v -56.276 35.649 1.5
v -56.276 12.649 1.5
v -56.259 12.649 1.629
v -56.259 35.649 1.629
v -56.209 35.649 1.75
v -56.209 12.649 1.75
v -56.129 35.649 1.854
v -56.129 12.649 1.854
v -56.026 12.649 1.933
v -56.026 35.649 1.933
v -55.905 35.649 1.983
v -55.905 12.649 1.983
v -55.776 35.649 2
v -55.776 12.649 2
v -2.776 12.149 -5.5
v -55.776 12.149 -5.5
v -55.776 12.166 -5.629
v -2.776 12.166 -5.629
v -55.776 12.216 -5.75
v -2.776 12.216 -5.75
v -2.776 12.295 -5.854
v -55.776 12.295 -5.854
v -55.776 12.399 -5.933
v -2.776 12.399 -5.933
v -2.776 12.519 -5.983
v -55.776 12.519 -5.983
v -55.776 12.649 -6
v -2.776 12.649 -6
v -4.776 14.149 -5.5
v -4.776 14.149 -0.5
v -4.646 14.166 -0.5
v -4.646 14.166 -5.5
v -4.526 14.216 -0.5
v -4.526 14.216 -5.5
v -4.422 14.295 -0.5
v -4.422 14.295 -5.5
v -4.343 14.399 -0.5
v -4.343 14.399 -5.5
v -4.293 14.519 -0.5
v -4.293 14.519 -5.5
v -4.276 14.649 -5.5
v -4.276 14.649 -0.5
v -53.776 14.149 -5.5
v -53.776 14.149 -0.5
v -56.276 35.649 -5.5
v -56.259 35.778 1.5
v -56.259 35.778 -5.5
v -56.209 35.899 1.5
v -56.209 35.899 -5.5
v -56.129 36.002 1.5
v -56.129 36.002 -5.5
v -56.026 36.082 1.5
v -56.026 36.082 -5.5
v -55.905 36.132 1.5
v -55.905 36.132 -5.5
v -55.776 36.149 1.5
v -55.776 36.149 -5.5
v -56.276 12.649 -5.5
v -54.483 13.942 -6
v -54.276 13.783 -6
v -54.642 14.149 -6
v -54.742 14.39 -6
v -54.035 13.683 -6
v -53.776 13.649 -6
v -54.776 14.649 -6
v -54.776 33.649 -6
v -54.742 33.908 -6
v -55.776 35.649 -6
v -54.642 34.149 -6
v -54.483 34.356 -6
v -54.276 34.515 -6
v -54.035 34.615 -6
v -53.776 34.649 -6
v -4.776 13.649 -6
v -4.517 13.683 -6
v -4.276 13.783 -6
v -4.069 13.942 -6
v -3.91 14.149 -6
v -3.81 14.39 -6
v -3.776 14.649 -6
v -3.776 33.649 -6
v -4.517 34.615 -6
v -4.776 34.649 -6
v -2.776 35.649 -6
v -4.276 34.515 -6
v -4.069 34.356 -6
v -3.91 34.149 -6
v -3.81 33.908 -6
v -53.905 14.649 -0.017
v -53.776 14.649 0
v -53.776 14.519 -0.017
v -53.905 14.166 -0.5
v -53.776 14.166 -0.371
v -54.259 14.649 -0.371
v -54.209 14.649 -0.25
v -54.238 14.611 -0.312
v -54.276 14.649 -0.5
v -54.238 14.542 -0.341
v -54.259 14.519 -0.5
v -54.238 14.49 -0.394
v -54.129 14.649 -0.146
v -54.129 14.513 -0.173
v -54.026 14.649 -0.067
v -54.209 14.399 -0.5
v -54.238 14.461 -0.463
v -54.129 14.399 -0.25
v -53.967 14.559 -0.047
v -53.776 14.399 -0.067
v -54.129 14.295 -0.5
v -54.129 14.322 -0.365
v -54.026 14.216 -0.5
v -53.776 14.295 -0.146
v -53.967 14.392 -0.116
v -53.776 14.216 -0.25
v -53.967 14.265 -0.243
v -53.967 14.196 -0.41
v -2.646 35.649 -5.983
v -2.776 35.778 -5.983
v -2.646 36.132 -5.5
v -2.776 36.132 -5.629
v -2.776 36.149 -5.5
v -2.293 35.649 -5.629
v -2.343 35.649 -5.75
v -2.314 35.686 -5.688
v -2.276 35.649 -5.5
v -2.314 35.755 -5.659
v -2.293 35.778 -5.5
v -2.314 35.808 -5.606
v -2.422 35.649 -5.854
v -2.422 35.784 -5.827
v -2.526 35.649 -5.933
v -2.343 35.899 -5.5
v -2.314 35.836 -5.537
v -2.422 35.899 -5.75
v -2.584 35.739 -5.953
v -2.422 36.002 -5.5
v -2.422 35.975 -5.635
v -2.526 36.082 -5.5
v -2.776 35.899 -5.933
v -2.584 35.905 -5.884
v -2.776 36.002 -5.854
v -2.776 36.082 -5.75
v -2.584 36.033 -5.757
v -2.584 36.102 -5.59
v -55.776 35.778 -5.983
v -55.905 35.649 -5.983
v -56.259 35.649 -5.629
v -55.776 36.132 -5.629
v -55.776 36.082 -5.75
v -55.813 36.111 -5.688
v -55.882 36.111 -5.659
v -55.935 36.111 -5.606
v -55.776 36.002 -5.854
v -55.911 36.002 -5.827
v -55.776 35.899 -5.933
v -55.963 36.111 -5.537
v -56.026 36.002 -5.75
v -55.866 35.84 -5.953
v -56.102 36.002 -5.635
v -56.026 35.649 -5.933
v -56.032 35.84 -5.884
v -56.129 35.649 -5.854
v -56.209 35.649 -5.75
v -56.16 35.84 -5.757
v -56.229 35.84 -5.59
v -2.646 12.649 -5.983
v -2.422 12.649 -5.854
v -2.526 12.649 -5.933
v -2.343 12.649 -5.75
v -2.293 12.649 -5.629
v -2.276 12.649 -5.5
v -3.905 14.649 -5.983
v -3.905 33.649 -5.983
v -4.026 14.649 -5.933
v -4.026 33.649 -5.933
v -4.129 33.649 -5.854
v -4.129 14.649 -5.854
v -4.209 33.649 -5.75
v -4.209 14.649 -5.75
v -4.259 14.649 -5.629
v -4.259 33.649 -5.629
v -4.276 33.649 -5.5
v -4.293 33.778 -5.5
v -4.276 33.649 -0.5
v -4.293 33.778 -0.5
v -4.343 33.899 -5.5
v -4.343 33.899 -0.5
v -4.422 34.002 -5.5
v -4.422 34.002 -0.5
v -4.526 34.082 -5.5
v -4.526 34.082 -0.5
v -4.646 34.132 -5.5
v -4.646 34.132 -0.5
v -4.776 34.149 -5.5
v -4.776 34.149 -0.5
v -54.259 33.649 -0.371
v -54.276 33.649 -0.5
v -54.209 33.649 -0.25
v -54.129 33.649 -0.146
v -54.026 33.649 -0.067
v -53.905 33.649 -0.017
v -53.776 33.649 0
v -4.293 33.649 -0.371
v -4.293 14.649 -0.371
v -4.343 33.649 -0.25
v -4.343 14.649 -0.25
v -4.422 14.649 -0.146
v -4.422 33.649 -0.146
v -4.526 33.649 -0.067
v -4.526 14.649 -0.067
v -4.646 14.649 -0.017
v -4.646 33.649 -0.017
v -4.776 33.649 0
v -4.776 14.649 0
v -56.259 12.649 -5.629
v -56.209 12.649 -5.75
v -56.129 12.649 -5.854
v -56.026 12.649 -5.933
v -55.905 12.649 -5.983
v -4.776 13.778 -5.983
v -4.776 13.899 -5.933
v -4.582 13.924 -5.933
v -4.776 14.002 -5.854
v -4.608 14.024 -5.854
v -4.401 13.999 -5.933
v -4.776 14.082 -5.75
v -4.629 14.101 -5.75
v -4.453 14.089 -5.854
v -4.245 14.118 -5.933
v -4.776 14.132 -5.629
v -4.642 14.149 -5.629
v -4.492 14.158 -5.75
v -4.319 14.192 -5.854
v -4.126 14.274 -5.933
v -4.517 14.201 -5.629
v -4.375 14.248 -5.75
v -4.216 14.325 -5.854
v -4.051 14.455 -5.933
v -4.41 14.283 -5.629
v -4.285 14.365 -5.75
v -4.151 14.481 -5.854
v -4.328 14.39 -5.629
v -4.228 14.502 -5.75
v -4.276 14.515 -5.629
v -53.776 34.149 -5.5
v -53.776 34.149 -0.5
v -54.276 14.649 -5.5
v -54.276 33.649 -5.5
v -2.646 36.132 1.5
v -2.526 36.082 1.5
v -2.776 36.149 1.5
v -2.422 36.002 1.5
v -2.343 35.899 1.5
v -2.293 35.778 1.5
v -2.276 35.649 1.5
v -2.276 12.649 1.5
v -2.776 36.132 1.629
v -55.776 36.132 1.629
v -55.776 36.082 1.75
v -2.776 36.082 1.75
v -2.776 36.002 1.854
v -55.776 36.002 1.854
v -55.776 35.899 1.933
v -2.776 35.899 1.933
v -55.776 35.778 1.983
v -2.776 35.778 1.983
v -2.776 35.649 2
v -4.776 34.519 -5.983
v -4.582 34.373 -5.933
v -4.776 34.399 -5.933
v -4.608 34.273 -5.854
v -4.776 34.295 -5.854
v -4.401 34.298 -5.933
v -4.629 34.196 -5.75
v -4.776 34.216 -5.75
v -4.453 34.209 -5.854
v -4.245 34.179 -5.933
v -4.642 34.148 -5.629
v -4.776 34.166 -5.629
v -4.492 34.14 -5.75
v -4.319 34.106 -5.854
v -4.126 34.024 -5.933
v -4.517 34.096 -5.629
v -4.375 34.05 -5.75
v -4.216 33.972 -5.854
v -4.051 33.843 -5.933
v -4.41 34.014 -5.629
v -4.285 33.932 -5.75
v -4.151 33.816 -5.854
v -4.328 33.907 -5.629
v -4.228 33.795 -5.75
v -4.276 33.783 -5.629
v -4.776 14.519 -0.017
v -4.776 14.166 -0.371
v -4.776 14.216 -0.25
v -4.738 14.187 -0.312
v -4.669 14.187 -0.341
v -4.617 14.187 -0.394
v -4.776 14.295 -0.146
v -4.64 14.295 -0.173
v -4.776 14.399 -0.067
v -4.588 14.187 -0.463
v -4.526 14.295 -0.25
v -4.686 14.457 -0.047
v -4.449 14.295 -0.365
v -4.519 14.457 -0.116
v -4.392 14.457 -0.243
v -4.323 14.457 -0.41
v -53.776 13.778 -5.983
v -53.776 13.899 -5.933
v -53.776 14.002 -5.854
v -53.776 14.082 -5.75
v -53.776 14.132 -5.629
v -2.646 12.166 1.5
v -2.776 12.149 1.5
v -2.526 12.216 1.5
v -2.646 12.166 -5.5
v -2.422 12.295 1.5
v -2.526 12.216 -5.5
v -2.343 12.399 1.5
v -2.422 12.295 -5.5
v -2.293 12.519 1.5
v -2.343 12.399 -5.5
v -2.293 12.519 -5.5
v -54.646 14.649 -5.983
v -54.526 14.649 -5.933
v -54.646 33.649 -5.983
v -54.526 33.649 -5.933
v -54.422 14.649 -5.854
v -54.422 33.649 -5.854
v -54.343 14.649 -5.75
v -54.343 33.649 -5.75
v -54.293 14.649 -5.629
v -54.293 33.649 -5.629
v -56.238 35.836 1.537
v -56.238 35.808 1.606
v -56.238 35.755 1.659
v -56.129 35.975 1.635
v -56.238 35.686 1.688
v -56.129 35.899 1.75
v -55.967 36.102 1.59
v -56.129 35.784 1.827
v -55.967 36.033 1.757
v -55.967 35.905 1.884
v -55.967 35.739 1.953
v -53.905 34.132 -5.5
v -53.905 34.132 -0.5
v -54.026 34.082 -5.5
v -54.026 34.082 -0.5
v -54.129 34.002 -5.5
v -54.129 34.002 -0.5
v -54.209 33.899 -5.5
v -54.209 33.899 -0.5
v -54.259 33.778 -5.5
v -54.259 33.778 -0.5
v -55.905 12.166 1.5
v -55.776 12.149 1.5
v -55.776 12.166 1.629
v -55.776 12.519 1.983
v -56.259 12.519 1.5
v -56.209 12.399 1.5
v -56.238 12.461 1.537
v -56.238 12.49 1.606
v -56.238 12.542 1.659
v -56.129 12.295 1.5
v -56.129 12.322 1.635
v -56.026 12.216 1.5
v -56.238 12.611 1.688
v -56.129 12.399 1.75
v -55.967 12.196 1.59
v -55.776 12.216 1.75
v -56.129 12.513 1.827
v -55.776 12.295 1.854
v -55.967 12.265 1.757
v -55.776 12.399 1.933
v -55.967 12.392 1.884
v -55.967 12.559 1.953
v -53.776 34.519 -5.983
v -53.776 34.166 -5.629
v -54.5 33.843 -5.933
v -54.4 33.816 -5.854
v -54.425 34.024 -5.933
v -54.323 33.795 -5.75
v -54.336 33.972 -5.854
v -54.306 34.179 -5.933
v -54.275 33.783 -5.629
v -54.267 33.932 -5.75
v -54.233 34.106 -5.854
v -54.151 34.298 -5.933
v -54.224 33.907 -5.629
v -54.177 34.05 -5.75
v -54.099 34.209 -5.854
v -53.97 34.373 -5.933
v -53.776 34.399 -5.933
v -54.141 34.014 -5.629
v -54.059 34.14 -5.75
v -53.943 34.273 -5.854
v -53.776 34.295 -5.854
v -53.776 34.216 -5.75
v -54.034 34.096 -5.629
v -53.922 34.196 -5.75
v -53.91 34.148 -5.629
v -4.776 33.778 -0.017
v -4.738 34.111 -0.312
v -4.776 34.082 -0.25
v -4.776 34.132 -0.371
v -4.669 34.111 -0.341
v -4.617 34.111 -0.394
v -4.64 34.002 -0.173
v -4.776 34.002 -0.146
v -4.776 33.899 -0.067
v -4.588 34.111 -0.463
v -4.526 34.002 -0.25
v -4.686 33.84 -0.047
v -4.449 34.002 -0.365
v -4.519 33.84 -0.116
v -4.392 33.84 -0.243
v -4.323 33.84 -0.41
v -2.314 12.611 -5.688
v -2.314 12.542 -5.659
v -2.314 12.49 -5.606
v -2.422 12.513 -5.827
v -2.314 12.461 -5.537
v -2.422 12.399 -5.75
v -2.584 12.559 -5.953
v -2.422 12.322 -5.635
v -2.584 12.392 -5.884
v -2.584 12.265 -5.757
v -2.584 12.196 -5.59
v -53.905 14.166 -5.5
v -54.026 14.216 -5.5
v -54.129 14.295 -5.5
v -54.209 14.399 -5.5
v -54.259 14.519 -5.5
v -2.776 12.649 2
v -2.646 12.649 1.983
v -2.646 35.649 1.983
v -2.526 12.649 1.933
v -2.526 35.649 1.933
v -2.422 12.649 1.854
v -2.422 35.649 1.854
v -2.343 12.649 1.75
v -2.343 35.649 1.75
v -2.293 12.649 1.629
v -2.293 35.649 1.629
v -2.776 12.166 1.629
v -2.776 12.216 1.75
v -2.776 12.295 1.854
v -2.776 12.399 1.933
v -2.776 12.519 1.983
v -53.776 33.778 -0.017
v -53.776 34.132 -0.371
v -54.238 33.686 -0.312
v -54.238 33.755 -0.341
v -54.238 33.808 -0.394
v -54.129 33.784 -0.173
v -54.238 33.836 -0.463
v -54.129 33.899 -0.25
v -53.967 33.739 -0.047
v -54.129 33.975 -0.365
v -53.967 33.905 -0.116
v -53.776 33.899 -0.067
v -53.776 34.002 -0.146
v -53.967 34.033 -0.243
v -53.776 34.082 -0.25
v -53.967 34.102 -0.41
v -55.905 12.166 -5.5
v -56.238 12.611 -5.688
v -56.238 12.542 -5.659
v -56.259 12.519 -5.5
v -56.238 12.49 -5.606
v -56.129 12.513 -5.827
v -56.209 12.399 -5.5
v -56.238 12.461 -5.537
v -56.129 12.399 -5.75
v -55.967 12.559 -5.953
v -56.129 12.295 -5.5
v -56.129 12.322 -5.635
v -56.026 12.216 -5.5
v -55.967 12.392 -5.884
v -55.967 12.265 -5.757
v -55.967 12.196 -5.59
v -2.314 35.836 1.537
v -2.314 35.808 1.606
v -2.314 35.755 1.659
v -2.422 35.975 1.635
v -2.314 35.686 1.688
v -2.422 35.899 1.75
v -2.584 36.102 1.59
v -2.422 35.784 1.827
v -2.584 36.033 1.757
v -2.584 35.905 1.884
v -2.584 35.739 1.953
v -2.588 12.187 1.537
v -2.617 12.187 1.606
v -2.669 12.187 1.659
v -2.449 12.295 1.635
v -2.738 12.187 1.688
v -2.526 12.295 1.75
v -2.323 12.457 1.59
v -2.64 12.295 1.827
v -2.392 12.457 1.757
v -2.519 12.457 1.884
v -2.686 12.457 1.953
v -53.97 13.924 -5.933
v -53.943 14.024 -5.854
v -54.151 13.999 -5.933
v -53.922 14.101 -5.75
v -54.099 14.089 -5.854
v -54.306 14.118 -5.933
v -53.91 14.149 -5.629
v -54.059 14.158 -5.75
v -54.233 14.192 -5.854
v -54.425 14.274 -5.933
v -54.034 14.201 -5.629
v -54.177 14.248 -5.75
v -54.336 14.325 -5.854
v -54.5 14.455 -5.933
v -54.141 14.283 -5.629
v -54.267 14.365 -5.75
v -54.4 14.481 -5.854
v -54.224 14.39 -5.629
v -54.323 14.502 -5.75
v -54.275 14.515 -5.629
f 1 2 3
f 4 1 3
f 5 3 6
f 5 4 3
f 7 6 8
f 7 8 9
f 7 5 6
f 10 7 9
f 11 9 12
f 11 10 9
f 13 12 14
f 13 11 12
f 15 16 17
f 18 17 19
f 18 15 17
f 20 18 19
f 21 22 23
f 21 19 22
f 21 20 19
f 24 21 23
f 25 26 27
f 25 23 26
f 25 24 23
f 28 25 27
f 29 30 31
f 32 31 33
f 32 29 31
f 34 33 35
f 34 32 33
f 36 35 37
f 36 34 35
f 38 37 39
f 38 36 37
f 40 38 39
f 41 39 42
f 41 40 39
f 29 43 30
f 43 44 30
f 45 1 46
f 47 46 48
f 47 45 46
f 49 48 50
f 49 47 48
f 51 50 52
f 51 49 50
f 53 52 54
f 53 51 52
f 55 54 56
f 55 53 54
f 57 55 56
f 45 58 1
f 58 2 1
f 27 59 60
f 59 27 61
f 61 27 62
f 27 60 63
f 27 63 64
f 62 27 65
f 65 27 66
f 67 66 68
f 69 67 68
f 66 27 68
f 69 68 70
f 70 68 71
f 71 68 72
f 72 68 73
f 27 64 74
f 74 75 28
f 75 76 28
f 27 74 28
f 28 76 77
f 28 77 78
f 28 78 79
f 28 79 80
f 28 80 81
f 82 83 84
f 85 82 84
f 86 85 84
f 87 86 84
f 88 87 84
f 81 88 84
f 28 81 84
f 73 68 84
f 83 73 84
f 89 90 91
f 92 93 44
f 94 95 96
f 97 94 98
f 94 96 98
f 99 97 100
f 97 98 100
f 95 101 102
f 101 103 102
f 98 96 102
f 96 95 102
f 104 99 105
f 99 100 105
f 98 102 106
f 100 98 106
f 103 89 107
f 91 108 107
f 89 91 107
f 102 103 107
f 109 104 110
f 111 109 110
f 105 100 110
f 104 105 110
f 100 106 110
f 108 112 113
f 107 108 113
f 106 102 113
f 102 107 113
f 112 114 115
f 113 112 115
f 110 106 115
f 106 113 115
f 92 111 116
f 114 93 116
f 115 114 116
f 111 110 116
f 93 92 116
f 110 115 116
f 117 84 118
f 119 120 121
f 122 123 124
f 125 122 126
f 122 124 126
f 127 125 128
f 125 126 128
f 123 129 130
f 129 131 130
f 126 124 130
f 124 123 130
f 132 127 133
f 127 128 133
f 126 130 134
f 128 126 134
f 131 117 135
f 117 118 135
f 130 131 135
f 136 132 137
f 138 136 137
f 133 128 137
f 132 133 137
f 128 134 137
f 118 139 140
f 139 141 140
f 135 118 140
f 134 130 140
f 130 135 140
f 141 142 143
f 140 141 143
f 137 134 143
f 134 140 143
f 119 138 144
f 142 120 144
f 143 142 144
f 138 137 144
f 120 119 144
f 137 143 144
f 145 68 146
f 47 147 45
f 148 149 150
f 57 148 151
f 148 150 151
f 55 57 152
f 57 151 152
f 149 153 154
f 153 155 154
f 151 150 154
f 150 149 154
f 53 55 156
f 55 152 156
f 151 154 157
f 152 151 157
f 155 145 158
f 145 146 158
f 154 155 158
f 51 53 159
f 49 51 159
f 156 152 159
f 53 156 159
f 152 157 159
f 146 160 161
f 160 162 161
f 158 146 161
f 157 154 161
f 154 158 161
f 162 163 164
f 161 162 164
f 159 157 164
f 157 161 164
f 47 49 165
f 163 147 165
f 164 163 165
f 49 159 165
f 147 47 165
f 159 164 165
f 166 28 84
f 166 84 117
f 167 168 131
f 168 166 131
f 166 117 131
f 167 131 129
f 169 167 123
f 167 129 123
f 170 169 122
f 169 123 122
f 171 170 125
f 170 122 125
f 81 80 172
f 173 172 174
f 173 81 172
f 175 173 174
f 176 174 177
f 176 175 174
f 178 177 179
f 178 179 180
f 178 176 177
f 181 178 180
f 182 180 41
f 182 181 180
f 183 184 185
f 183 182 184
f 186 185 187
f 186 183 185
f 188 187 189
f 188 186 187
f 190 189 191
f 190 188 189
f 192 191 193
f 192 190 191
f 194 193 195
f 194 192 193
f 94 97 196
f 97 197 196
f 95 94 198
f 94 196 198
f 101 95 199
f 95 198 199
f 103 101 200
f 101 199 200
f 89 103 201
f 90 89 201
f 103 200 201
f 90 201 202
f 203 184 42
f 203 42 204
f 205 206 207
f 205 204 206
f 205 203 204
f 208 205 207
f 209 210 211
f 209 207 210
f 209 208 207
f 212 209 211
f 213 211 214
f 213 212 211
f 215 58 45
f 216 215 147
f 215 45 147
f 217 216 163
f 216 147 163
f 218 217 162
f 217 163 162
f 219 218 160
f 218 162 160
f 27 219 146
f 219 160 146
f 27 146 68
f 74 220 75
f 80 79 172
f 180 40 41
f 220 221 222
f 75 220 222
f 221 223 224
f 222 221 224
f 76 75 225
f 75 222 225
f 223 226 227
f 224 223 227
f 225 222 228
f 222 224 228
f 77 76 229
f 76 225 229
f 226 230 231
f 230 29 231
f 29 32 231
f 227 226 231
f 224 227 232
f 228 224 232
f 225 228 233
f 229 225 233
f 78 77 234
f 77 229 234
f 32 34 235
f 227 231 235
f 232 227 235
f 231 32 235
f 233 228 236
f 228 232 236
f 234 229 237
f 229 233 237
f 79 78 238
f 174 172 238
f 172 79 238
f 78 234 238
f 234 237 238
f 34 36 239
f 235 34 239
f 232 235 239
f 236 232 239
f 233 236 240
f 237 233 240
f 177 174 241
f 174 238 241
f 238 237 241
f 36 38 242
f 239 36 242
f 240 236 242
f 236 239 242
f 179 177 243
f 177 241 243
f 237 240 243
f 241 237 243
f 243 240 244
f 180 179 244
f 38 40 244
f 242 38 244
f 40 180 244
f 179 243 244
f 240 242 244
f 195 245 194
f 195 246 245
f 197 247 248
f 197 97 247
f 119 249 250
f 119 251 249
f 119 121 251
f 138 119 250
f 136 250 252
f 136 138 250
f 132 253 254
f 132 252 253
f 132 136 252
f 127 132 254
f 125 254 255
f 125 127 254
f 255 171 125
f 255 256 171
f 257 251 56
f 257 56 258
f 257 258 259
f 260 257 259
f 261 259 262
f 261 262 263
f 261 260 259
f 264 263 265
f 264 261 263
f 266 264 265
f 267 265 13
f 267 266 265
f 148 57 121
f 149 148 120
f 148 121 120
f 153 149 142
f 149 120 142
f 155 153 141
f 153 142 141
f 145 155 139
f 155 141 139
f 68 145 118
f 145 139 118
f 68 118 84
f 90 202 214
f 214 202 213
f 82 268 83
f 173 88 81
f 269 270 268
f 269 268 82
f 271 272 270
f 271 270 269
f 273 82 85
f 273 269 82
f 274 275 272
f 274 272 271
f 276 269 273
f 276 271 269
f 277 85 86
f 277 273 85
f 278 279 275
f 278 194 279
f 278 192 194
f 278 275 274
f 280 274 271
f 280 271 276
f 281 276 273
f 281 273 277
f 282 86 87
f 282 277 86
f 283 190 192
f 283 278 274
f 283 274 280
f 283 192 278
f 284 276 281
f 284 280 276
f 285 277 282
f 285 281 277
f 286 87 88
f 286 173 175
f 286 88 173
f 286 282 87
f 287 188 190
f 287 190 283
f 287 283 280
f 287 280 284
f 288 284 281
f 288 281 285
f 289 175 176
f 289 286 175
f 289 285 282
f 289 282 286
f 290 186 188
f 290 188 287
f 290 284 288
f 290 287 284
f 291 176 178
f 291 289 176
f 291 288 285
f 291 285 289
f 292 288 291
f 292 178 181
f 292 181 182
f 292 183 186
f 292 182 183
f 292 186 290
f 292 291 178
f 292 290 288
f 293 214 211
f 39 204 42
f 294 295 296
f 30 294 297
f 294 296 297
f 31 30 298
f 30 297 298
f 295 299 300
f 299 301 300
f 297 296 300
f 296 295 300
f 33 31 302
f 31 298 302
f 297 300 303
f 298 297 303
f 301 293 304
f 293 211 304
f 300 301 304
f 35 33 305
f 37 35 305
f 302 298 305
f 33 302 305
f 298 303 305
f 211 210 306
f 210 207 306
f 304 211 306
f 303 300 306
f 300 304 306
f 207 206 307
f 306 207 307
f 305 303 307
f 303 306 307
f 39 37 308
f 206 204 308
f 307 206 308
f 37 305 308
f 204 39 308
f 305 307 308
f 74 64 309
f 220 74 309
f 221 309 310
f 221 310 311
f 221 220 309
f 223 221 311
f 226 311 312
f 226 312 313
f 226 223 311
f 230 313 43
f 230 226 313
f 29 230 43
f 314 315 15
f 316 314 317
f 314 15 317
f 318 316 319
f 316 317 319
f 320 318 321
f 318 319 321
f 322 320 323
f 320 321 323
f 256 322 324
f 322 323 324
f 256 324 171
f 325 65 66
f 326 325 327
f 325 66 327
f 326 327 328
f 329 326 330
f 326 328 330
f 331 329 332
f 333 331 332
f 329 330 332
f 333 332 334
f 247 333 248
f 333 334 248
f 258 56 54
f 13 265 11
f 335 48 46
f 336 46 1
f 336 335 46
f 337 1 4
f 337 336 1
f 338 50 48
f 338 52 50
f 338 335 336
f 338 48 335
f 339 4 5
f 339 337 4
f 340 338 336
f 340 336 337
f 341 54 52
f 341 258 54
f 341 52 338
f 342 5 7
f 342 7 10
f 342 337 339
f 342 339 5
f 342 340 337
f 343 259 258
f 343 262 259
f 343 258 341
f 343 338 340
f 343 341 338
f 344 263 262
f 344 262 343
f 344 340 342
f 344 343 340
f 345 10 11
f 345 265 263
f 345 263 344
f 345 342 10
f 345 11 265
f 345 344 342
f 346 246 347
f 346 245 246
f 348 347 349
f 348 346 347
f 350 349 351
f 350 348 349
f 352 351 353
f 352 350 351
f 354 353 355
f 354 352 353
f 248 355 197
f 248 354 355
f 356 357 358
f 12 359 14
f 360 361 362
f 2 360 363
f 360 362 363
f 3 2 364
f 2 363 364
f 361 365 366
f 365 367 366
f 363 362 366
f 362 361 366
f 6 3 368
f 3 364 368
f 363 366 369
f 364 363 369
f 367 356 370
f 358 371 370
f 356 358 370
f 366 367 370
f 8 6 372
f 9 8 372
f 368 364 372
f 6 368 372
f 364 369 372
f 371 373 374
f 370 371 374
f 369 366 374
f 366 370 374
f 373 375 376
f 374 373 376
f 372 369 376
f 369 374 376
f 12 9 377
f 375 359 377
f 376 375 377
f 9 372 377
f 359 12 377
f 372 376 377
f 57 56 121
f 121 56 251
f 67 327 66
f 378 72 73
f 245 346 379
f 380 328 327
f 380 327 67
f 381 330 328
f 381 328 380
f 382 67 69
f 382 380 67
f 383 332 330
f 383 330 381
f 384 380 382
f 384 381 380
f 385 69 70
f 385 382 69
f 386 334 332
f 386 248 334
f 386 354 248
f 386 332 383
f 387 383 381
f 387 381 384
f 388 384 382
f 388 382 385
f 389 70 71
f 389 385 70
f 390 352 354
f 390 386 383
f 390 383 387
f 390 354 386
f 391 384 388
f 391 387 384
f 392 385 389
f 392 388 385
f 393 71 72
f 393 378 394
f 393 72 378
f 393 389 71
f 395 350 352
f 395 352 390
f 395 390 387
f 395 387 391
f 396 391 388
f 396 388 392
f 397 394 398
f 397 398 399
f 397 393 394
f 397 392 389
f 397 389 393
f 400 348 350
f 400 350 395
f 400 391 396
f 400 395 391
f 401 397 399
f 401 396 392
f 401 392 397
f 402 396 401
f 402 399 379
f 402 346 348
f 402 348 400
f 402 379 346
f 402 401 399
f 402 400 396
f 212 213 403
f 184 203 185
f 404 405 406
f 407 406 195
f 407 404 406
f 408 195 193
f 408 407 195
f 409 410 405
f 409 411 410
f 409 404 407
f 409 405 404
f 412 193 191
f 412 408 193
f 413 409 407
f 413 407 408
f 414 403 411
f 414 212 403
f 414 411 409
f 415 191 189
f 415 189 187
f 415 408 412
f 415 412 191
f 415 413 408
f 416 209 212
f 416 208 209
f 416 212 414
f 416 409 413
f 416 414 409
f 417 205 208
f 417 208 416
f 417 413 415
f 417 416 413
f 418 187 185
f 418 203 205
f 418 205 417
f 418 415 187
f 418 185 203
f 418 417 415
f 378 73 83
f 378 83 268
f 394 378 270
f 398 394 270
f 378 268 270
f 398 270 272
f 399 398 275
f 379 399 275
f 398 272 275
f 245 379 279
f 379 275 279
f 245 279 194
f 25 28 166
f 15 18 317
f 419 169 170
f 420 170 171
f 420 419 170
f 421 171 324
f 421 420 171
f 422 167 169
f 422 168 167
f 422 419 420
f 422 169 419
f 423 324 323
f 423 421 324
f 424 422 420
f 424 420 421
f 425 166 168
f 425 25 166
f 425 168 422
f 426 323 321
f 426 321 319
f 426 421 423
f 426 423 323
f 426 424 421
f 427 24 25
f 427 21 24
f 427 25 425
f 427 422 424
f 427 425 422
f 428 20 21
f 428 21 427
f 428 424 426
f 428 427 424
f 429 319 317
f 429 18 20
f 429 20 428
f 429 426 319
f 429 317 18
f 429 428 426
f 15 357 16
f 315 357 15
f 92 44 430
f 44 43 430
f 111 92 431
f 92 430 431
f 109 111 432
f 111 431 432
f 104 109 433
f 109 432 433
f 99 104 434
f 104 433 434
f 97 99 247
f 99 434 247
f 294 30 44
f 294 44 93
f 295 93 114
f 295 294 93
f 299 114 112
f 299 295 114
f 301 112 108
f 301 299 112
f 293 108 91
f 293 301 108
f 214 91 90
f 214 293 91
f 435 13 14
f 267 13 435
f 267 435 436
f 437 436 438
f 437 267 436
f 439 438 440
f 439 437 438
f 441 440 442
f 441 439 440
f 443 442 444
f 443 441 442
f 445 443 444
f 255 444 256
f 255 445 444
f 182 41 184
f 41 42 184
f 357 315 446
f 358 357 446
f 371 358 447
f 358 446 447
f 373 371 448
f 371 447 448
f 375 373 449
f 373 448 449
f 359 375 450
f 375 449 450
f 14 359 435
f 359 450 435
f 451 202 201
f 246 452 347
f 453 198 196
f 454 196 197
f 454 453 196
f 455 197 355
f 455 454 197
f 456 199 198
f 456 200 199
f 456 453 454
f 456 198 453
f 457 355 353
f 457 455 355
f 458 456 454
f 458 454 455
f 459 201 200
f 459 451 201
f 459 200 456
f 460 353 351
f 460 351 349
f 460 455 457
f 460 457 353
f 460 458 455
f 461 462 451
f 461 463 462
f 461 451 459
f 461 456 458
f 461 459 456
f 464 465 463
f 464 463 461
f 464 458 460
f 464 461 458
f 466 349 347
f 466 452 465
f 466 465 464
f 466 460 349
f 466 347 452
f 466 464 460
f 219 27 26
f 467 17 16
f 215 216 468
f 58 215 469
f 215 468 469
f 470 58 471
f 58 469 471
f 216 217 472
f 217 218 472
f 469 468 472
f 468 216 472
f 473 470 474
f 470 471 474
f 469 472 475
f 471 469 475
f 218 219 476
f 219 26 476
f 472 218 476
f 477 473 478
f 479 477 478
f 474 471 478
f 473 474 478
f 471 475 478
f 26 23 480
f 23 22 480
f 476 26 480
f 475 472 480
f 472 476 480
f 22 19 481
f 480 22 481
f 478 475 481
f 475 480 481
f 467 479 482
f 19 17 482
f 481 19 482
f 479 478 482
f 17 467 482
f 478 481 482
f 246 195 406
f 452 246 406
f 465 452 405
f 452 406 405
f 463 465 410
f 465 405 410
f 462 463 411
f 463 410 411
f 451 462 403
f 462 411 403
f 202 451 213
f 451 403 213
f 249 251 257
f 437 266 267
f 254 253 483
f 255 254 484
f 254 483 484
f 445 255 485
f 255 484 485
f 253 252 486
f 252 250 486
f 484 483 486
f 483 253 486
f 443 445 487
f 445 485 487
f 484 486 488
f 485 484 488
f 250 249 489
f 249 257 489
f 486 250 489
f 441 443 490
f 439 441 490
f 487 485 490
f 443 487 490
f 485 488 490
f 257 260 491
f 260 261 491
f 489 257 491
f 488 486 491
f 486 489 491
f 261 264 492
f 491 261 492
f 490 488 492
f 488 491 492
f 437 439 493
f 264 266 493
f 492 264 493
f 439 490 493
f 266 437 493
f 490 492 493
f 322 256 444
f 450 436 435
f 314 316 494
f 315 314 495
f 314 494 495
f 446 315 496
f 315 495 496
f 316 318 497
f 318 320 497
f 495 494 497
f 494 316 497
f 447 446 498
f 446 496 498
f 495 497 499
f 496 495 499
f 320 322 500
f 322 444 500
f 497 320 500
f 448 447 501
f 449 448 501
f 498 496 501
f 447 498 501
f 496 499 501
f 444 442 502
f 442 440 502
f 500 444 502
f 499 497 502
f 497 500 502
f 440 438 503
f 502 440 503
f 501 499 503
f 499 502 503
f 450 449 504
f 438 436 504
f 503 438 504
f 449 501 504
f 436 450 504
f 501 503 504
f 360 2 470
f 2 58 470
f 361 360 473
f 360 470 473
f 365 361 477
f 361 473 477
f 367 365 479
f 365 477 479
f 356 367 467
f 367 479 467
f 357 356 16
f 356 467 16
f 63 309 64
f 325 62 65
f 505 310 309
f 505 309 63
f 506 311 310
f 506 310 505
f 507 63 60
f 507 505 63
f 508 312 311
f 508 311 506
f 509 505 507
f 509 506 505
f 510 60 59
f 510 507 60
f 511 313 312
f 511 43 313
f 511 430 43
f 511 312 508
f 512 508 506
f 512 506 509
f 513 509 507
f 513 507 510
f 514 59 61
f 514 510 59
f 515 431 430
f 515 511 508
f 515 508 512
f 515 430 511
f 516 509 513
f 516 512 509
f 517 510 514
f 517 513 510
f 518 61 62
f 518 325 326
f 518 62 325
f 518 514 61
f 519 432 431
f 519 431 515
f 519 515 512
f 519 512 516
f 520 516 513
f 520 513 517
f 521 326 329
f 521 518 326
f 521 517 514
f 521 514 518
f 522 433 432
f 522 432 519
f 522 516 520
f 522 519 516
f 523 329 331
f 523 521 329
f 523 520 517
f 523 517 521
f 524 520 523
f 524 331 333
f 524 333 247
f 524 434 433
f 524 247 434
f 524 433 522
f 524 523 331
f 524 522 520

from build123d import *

# Parameters (mm, degrees)
F0_W     = 50
F0_H     = 20
F1_DEPTH = 2
F2_W     = 54
F2_H     = 24
F2_W_2   = 50
F2_H_2   = 20
F3_DEPTH = 8
F4_R     = 0.5


with BuildPart() as f1:
    # F0 (on Top) → F1 (new body)
    with BuildSketch(Plane.XY):
        with Locations((-29.275745, 24.148707)):
            Rectangle(F0_W, F0_H)
    extrude(amount=F1_DEPTH)

    # F2 (on face) → F3 (join)
    with BuildSketch(Plane.XY.offset(2)):
        with Locations((-29.275745, 24.148707)):
            Rectangle(F2_W, F2_H)
        with Locations((-29.275745, 24.148707)):
            Rectangle(F2_W_2, F2_H_2, mode=Mode.SUBTRACT)
    extrude(amount=-F3_DEPTH)

    # F4
    f4_edges = [f1.edges().sort_by_distance(p)[0] for p in [
        (-29.275745, 12.148707, -6),
        (-29.275745, 14.148707, -6),
        (-56.275745, 24.148707, -6),
        (-54.275745, 24.148707, -6),
        (-29.275745, 36.148707, -6),
        (-29.275745, 34.148707, -6),
        (-4.275745, 24.148707, -6),
        (-2.275745, 24.148707, -6),
        (-4.275745, 24.148707, 0),
        (-29.275745, 14.148707, 0),
        (-4.275745, 14.148707, -3),
        (-29.275745, 34.148707, 0),
        (-4.275745, 34.148707, -3),
        (-54.275745, 24.148707, 0),
        (-54.275745, 34.148707, -3),
        (-54.275745, 14.148707, -3),
        (-29.275745, 36.148707, 2),
        (-2.275745, 36.148707, -2),
        (-2.275745, 24.148707, 2),
        (-2.275745, 12.148707, -2),
        (-29.275745, 12.148707, 2),
        (-56.275745, 12.148707, -2),
        (-56.275745, 36.148707, -2),
        (-56.275745, 24.148707, 2),
    ]]
    fillet(f4_edges, radius=F4_R)


solid = f1.part
